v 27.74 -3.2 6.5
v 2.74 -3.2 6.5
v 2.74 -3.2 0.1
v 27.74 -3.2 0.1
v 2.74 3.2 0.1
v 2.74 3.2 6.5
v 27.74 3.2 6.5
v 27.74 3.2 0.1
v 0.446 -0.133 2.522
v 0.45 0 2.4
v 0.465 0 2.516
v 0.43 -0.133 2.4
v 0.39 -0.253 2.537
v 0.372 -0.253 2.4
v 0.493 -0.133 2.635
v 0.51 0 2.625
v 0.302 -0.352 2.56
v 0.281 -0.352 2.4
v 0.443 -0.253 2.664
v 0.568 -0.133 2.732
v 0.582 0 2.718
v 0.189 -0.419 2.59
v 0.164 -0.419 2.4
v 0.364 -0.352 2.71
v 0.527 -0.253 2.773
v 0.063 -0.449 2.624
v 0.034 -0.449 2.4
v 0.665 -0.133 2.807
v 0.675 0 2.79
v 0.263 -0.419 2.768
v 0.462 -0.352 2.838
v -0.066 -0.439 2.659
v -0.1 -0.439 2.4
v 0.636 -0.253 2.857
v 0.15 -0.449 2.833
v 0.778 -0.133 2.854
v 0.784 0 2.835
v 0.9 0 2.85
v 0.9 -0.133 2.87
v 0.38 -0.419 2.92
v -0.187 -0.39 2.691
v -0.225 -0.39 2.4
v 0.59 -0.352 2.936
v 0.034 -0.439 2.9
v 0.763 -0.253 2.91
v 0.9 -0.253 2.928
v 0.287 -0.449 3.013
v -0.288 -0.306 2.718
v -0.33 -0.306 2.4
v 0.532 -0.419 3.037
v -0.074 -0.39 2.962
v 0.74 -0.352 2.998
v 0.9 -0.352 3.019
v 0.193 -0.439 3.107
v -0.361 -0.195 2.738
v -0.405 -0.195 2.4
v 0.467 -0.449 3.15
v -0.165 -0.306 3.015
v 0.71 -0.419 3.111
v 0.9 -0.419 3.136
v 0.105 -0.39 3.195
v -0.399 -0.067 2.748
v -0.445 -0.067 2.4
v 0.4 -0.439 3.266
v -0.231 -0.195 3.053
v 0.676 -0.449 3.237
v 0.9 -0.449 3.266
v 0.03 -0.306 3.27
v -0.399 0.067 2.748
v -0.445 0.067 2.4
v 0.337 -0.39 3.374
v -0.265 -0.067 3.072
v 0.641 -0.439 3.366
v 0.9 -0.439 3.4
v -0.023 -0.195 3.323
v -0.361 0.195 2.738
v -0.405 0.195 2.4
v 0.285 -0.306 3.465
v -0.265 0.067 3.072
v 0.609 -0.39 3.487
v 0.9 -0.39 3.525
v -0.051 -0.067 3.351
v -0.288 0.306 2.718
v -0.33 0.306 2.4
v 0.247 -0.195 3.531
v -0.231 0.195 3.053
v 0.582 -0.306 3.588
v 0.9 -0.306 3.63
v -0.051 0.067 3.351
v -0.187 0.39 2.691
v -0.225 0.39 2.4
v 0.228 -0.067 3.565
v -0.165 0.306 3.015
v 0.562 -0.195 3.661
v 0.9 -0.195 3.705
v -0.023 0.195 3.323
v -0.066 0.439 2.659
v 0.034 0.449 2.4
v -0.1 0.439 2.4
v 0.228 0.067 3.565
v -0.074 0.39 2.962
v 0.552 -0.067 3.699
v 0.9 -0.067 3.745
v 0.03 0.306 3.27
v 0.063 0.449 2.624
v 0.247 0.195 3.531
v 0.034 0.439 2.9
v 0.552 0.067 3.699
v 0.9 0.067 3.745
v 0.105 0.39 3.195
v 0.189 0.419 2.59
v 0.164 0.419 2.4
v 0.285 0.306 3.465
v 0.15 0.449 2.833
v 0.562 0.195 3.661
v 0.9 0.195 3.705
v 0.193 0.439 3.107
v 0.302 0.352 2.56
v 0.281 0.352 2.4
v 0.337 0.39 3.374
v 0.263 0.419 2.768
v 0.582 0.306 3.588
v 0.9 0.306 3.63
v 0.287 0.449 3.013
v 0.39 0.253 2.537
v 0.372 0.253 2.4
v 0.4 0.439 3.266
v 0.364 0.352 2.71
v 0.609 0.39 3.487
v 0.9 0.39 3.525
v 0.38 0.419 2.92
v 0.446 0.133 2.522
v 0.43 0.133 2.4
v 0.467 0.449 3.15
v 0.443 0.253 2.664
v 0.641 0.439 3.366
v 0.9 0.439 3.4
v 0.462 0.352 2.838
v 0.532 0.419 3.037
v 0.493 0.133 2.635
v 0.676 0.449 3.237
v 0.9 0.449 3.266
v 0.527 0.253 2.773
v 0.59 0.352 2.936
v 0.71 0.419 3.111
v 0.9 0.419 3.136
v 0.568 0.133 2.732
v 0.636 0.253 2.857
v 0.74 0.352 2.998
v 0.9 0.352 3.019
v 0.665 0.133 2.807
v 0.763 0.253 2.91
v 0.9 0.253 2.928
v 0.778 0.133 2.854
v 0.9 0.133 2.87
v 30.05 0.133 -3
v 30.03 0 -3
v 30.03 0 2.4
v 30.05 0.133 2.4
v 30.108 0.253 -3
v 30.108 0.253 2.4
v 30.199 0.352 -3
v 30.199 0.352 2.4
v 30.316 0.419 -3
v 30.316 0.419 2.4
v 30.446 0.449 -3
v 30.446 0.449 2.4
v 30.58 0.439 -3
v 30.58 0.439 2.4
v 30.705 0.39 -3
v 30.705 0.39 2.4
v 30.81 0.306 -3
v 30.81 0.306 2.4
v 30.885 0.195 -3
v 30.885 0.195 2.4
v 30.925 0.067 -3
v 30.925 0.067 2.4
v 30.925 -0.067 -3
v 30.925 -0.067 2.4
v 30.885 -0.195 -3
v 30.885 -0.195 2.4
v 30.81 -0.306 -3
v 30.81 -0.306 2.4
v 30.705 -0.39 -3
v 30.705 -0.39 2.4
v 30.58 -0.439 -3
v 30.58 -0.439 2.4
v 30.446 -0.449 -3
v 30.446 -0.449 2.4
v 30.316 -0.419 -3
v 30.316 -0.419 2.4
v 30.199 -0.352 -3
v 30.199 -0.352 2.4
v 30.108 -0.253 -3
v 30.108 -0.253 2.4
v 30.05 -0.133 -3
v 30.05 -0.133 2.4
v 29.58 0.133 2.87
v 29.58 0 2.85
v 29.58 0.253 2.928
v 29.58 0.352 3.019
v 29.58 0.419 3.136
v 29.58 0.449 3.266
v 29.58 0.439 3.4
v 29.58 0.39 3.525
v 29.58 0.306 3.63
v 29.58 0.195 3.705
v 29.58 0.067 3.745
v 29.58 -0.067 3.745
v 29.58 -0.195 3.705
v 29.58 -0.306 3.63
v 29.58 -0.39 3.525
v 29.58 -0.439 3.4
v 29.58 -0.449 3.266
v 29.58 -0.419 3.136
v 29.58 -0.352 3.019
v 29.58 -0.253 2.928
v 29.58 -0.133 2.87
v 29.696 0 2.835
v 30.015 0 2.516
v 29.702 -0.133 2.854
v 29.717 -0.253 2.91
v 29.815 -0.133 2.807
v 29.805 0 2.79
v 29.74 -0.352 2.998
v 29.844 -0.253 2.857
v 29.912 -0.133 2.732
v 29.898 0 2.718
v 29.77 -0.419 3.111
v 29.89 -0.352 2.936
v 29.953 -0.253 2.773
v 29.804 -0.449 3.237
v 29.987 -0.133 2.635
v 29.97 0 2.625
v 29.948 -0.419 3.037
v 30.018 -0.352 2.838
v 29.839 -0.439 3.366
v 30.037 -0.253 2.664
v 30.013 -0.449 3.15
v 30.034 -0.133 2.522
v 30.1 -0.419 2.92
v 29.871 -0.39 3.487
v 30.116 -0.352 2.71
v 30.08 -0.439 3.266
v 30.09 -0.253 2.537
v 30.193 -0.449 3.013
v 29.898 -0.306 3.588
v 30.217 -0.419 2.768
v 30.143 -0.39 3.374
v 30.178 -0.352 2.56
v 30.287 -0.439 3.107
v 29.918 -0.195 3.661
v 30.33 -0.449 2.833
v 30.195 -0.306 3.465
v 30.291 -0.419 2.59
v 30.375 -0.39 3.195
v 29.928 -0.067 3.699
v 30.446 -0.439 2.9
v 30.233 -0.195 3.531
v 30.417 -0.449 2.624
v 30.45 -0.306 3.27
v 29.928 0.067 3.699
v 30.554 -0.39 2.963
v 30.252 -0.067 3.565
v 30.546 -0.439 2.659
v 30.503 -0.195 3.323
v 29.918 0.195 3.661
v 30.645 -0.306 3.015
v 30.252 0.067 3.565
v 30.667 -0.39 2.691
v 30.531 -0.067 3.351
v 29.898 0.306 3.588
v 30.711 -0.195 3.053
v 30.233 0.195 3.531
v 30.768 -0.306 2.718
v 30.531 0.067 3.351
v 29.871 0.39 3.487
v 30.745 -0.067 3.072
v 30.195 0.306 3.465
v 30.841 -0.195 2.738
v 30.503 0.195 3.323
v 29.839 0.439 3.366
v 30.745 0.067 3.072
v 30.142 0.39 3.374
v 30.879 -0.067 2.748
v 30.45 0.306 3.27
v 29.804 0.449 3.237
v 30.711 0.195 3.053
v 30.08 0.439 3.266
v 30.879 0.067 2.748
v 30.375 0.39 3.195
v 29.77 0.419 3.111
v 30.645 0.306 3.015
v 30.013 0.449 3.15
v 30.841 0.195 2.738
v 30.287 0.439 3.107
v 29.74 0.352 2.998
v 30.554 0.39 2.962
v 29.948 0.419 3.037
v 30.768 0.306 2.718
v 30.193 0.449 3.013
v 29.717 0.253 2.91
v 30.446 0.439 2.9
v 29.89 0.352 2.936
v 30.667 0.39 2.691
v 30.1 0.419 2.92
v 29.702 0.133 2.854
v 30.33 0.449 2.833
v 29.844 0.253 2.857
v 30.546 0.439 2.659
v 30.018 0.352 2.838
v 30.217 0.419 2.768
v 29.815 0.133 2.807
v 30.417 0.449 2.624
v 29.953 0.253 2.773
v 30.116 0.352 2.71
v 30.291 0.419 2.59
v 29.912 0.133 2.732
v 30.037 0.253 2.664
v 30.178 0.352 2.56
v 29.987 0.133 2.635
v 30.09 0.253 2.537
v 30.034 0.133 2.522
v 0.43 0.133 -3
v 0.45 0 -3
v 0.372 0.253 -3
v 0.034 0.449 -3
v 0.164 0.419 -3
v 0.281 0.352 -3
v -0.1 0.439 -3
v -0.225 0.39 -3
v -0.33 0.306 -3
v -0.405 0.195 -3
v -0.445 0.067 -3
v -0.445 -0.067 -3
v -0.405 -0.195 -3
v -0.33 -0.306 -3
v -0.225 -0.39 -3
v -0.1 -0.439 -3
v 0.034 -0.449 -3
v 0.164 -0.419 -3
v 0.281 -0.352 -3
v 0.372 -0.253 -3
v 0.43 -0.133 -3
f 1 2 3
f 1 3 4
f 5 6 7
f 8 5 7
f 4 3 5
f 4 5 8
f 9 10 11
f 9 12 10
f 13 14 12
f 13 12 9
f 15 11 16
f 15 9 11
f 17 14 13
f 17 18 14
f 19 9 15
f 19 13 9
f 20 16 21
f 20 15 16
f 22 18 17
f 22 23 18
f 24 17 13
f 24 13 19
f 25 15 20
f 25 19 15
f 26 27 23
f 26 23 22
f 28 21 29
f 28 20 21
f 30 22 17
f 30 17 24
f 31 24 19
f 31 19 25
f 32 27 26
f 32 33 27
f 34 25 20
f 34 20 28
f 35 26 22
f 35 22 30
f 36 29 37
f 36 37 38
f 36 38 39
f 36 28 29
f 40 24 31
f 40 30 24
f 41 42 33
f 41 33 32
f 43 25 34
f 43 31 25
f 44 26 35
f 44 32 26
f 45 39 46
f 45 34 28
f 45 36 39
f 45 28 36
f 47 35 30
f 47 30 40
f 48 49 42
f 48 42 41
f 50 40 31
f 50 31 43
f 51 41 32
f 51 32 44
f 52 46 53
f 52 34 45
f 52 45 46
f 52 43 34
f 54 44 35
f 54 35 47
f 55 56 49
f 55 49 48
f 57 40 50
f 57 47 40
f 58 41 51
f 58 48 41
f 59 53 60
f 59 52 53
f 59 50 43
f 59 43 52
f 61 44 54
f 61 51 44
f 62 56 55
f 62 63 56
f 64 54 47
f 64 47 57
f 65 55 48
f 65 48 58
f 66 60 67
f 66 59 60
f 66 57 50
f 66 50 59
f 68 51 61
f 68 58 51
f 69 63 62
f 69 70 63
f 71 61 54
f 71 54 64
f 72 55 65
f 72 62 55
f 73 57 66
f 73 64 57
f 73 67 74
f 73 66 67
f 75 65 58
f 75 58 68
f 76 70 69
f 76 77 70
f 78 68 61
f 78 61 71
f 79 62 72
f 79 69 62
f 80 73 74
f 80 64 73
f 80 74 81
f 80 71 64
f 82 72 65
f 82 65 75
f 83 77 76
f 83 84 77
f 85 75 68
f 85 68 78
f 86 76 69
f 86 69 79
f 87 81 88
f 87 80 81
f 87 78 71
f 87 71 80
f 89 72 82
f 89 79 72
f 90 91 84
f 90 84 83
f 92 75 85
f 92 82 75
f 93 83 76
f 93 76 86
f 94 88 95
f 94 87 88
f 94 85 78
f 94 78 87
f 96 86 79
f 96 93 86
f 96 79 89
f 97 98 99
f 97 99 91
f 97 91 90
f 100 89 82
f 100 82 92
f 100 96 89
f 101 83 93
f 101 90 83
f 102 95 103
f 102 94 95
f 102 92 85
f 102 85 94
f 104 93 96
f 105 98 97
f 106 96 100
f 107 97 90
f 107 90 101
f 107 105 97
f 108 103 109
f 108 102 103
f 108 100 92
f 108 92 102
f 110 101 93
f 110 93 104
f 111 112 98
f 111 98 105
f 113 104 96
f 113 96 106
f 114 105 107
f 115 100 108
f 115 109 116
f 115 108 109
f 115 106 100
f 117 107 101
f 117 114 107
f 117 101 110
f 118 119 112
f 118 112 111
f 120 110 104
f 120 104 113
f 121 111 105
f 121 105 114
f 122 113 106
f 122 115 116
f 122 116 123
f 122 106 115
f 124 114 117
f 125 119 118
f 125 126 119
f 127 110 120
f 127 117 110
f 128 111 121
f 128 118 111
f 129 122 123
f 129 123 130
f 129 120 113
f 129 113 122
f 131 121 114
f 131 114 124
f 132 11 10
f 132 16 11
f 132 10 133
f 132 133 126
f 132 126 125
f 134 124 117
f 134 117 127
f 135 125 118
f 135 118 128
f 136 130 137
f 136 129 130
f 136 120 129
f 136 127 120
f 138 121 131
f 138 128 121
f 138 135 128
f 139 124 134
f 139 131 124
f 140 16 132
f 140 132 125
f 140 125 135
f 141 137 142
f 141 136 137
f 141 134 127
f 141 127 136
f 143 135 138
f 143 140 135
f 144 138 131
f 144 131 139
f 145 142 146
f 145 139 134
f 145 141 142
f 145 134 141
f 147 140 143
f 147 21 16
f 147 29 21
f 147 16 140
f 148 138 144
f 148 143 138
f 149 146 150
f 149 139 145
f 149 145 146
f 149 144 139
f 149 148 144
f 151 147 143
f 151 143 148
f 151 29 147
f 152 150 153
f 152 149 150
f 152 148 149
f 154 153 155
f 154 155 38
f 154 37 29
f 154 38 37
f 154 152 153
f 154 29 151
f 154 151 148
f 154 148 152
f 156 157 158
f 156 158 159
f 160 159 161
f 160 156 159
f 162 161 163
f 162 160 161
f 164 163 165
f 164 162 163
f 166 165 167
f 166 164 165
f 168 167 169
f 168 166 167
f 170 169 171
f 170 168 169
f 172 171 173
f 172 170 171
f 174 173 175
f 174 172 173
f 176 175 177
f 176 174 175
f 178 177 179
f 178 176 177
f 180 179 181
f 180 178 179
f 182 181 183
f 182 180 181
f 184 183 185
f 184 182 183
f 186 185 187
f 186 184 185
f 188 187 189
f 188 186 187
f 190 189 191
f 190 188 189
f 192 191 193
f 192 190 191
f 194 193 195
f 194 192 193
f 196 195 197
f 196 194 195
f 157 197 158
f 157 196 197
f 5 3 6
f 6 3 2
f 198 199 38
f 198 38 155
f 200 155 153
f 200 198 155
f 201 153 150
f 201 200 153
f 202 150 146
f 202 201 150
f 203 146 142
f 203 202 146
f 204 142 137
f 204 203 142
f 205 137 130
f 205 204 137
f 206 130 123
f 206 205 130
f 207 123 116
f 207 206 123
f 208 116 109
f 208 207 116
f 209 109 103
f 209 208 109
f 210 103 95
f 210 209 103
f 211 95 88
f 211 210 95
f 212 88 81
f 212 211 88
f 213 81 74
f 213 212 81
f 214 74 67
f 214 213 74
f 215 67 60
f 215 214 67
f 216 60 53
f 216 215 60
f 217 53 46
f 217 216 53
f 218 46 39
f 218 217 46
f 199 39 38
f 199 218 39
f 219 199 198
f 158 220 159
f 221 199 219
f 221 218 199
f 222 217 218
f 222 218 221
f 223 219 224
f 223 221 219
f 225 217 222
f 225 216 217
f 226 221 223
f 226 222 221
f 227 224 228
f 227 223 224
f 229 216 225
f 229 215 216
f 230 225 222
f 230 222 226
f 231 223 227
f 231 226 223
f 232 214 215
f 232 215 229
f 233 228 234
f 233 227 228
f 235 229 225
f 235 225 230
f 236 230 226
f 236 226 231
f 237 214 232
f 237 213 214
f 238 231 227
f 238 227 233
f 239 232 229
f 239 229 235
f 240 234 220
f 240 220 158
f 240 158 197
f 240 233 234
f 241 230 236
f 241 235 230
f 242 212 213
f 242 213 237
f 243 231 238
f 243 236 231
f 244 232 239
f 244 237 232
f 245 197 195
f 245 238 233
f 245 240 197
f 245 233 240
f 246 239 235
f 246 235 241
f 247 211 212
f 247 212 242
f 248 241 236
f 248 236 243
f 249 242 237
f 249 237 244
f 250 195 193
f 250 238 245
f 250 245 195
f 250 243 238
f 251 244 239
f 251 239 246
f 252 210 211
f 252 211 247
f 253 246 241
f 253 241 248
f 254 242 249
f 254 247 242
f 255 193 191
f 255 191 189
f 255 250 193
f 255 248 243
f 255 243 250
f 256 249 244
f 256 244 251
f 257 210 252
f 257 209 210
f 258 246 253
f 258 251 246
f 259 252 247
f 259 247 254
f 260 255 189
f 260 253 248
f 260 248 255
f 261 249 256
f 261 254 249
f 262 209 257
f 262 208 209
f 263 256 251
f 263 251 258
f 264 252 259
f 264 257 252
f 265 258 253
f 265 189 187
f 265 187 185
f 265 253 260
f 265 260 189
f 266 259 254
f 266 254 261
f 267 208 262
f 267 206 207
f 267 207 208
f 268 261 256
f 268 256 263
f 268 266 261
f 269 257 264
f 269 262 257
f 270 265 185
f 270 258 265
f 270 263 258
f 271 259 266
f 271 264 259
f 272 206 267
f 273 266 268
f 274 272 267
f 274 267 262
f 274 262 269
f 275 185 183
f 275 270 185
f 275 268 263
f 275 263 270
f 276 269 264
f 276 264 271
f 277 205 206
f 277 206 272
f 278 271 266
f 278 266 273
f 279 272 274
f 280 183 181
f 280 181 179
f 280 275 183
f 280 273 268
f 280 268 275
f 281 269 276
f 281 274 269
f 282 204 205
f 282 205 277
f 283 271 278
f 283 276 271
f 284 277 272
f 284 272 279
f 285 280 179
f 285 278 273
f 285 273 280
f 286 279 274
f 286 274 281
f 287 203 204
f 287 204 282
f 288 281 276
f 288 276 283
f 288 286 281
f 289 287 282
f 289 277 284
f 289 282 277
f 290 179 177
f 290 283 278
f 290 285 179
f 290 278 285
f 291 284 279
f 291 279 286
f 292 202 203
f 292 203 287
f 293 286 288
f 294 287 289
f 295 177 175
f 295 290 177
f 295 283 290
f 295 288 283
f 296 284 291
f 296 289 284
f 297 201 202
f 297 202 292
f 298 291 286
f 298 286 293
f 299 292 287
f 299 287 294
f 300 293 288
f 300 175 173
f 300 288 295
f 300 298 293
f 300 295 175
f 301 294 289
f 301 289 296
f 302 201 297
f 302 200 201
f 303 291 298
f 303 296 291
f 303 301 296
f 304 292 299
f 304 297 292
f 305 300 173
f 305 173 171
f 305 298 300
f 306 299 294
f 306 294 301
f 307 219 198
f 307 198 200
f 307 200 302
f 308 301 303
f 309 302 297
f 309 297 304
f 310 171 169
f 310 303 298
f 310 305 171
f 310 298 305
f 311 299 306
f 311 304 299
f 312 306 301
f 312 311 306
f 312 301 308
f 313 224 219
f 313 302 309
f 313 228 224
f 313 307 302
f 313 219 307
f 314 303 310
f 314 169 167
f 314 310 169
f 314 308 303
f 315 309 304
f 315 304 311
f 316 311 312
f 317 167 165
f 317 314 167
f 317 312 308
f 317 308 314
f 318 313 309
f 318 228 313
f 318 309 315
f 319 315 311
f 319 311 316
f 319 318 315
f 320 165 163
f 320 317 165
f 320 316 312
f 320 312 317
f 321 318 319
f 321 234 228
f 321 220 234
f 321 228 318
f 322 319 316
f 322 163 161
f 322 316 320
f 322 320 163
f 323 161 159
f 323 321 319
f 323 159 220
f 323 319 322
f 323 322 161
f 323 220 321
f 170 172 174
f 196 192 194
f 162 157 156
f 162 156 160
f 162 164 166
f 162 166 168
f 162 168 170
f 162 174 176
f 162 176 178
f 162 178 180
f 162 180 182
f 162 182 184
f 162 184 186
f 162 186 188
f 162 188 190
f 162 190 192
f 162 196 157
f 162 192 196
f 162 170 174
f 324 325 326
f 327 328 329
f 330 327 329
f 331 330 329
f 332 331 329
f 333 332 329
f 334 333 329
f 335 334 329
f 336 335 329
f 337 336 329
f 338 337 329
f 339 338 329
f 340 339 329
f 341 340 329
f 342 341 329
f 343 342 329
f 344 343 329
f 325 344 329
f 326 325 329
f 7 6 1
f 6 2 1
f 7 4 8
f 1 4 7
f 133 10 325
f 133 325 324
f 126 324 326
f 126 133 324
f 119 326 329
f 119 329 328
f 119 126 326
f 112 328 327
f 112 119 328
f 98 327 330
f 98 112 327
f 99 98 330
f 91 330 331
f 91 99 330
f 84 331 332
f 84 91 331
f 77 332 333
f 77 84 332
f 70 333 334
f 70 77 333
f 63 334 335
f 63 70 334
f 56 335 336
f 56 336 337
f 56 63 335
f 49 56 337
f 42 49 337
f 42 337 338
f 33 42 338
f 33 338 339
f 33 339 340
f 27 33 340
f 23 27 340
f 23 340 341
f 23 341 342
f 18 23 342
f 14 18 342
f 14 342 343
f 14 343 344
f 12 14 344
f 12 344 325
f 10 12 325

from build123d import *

# Parameters (mm, degrees)
SKETCH_R    = 0.45
SKETCH002_W = 25
SKETCH002_H = 6.4
PAD_DEPTH   = 3.2


with BuildPart() as sweep_body:
    # Sweep: sweep along a path in Sketch001
    with BuildLine(Plane.XZ) as sweep_path:
        Line((0, -3), (0, 2.4))
        ThreePointArc((0, 2.4), (0.263601, 3.036393), (0.899991, 3.3))
        Line((0.899991, 3.3), (29.58, 3.3))
        ThreePointArc((29.58, 3.3), (30.216396, 3.036396), (30.48, 2.4))
        Line((30.48, 2.4), (30.48, -3))
    # Sketch → Sweep (sweep)
    with BuildSketch(Plane.XY.offset(-2)):
        Circle(SKETCH_R)
    sweep(path=sweep_path.line)


with BuildPart() as pad:
    # Sketch002 → Pad (new body, symmetric)
    with BuildSketch(Plane.XZ):
        with Locations((15.24, 3.3)):
            Rectangle(SKETCH002_W, SKETCH002_H)
    extrude(amount=PAD_DEPTH, both=True)


solid = Compound([sweep_body.part, pad.part])
